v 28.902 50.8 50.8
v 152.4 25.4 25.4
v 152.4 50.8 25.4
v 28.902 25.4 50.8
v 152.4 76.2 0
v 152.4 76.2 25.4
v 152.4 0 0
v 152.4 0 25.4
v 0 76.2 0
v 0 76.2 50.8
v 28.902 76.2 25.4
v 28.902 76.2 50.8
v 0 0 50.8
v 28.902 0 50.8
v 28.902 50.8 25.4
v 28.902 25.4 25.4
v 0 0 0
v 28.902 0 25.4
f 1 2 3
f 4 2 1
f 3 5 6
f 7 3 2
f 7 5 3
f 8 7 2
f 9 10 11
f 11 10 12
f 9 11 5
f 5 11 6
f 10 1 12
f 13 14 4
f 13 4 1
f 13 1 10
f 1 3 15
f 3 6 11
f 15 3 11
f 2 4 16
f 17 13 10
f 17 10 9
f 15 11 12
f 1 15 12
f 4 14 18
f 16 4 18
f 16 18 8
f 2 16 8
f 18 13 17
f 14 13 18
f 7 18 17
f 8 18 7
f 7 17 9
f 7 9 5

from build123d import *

# Parameters (mm, degrees)
F1_DEPTH = 76.2
F3_DEPTH = 76.2
F5_DEPTH = 25.4
F7_DEPTH = 25.4


with BuildPart() as f1:
    # F0 (on Front) → F1 (new body)
    with BuildSketch(Plane.XZ):
        Polygon((0, 50.8), (0, 0), (152.4, 0), (152.4, 25.4), (28.901575, 25.4), (28.901575, 50.8), align=None)
    extrude(amount=-F1_DEPTH)

    # F2 (on face) → F3 (join)
    with BuildSketch(Plane.XZ):
        Polygon((152.4, 25.4), (28.901575, 50.8), (28.901575, 25.4), align=None)
    extrude(amount=-F3_DEPTH)

    # F4 (on face) → F5 (cut)
    with BuildSketch(Plane.XZ):
        Polygon((152.4, 25.4), (28.901575, 50.8), (28.901575, 25.4), align=None)
    extrude(amount=-F5_DEPTH, mode=Mode.SUBTRACT)

    # F6 (on face) → F7 (cut)
    with BuildSketch(Plane(origin=(0, 76.2, 0), x_dir=(-1, 0, 0), z_dir=(0, 1, 0))):
        Polygon((-28.901575, 50.8), (-152.4, 25.4), (-28.901575, 25.4), align=None)
    extrude(amount=-F7_DEPTH, mode=Mode.SUBTRACT)


solid = f1.part
